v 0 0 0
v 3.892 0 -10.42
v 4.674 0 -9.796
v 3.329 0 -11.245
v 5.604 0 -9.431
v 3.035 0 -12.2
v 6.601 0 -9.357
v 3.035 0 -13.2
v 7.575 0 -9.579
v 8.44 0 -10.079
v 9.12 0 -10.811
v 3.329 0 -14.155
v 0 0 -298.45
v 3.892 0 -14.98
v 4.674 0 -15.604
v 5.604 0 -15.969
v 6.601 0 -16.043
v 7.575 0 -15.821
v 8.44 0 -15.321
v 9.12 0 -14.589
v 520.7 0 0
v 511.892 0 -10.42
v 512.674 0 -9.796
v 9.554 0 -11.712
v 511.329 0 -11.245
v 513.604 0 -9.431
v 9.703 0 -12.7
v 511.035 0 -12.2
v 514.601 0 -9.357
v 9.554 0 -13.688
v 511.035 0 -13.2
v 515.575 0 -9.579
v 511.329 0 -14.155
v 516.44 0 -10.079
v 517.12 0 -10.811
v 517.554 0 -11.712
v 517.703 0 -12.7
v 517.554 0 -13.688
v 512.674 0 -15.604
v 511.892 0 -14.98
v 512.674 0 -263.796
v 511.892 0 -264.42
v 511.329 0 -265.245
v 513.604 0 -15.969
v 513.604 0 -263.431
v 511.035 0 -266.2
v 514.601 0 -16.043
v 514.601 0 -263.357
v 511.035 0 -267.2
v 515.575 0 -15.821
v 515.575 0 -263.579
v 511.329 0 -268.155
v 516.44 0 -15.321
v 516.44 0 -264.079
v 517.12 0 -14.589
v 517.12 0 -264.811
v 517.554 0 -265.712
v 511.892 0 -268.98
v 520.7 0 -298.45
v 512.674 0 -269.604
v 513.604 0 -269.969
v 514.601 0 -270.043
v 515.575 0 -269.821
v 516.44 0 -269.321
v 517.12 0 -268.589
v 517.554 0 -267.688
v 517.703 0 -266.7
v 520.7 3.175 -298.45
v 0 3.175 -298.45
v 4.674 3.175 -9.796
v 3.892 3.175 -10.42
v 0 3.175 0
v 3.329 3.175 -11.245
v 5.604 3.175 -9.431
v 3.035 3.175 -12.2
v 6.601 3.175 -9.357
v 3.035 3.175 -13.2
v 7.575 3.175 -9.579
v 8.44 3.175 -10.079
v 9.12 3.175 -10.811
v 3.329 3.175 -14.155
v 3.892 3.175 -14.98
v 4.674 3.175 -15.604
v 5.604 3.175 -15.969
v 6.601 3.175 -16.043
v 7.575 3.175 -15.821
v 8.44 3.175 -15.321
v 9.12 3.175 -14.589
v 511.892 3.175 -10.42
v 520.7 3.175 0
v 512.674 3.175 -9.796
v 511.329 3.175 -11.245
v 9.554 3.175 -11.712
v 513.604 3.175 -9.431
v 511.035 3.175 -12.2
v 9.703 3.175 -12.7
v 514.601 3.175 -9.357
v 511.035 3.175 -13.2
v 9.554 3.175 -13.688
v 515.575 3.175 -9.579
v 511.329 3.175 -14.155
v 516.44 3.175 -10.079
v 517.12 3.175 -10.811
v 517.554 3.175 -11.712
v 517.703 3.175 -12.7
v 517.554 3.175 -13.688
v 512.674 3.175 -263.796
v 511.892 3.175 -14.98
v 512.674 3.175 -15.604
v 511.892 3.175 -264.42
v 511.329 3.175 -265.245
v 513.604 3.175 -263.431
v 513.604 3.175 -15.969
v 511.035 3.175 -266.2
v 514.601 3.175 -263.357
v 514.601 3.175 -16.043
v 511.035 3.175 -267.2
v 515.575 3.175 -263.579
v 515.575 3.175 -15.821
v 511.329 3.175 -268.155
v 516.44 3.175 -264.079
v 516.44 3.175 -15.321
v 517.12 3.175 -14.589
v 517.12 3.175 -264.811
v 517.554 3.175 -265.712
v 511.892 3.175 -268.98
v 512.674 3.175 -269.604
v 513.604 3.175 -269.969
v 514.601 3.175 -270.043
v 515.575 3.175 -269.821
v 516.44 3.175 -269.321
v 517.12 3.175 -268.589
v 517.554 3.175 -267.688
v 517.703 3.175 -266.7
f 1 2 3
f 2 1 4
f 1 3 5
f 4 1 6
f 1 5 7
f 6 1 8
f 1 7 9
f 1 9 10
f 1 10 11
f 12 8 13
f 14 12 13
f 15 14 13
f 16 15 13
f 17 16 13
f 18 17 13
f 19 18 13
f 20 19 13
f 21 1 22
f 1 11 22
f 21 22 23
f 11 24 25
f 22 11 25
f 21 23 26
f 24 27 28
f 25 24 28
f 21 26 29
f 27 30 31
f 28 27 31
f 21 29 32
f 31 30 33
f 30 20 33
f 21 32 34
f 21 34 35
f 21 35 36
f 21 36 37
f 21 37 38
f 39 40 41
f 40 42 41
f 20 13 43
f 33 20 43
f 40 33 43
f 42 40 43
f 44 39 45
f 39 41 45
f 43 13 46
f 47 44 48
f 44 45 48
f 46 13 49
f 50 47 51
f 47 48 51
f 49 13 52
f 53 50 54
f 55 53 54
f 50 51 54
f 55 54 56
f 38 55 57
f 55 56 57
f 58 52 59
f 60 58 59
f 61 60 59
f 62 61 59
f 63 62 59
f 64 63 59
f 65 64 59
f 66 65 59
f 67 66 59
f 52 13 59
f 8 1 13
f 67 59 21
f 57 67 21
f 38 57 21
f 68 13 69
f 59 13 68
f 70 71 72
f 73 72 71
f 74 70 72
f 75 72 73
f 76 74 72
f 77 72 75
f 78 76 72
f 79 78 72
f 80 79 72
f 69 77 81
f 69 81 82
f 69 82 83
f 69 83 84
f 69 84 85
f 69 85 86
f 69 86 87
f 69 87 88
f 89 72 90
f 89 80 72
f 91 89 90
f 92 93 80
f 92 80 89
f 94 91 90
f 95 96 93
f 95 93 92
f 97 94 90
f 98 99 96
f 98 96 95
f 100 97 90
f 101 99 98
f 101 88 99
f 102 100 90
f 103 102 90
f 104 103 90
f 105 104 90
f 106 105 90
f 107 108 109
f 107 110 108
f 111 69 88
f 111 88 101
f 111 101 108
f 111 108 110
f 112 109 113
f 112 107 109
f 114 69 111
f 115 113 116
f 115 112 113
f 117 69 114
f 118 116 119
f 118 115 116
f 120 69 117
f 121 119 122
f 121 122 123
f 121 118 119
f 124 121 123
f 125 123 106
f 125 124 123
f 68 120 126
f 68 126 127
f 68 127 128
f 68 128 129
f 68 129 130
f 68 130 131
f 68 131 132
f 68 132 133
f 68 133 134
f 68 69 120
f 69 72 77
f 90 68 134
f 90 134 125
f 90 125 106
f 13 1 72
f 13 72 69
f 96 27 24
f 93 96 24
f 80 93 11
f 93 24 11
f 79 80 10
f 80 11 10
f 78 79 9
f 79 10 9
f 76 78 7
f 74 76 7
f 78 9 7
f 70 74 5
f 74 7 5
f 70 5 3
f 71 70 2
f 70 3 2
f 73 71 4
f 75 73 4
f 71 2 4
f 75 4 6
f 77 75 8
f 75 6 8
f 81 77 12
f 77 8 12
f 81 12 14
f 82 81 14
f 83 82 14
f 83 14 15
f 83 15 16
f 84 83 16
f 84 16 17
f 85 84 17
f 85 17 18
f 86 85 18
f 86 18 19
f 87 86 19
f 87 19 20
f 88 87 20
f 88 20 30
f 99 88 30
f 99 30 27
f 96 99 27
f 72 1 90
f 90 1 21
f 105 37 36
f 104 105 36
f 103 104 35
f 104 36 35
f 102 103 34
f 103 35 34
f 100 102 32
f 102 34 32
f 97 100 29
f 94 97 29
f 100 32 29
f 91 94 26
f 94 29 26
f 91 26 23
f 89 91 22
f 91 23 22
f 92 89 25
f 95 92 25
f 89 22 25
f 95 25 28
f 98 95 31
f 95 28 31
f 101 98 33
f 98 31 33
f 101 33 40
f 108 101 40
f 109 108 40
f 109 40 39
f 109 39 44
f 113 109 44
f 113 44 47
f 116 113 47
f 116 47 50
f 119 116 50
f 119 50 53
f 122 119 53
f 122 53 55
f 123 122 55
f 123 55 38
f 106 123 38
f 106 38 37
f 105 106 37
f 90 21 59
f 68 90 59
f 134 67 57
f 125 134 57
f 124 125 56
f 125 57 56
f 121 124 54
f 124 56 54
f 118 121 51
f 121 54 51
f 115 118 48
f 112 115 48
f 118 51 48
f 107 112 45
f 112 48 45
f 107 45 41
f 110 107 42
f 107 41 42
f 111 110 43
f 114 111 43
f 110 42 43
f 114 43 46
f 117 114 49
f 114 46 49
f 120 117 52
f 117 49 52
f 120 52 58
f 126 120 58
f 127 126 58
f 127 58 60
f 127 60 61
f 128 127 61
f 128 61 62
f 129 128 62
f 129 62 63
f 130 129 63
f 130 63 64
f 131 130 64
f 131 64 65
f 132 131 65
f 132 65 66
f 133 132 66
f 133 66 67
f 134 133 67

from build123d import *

# Parameters (mm, degrees)
SKETCH1_W           = 520.7
SKETCH1_H           = 298.45
BOSS_EXTRUDE1_DEPTH = 3.175
CUT_EXTRUDE1_REACH  = 5.175
SKETCH2_R           = 3.3528


with BuildPart() as part:
    # Sketch1 → Boss-Extrude1 (new body)
    with BuildSketch(Plane(origin=(0, 0, 0), x_dir=(1, 0, 0), z_dir=(0, 1, 0))):
        with Locations((260.35, 149.225)):
            Rectangle(SKETCH1_W, SKETCH1_H)
    extrude(amount=BOSS_EXTRUDE1_DEPTH)

    # Sketch2 → Cut-Extrude1 (cut, up to next)
    with BuildSketch(Plane.XZ, mode=Mode.PRIVATE) as cut_extrude1_sk1:
        with Locations((6.35, -12.7)):
            Circle(SKETCH2_R)
    cut_extrude1_tool1 = extrude(cut_extrude1_sk1.sketch, amount=-CUT_EXTRUDE1_REACH, mode=Mode.PRIVATE) & part.part
    add(cut_extrude1_tool1.solids().sort_by_distance((6.35, 0, -12.7))[0], mode=Mode.SUBTRACT)
    # Sketch2 → Cut-Extrude1 (cut, up to next)
    with BuildSketch(Plane.XZ, mode=Mode.PRIVATE) as cut_extrude1_sk2:
        with Locations((514.35, -12.7)):
            Circle(SKETCH2_R)
    cut_extrude1_tool2 = extrude(cut_extrude1_sk2.sketch, amount=-CUT_EXTRUDE1_REACH, mode=Mode.PRIVATE) & part.part
    add(cut_extrude1_tool2.solids().sort_by_distance((514.35, 0, -12.7))[0], mode=Mode.SUBTRACT)
    # Sketch2 → Cut-Extrude1 (cut, up to next)
    with BuildSketch(Plane.XZ, mode=Mode.PRIVATE) as cut_extrude1_sk3:
        with Locations((514.35, -266.7)):
            Circle(SKETCH2_R)
    cut_extrude1_tool3 = extrude(cut_extrude1_sk3.sketch, amount=-CUT_EXTRUDE1_REACH, mode=Mode.PRIVATE) & part.part
    add(cut_extrude1_tool3.solids().sort_by_distance((514.35, 0, -266.7))[0], mode=Mode.SUBTRACT)


solid = part.part
